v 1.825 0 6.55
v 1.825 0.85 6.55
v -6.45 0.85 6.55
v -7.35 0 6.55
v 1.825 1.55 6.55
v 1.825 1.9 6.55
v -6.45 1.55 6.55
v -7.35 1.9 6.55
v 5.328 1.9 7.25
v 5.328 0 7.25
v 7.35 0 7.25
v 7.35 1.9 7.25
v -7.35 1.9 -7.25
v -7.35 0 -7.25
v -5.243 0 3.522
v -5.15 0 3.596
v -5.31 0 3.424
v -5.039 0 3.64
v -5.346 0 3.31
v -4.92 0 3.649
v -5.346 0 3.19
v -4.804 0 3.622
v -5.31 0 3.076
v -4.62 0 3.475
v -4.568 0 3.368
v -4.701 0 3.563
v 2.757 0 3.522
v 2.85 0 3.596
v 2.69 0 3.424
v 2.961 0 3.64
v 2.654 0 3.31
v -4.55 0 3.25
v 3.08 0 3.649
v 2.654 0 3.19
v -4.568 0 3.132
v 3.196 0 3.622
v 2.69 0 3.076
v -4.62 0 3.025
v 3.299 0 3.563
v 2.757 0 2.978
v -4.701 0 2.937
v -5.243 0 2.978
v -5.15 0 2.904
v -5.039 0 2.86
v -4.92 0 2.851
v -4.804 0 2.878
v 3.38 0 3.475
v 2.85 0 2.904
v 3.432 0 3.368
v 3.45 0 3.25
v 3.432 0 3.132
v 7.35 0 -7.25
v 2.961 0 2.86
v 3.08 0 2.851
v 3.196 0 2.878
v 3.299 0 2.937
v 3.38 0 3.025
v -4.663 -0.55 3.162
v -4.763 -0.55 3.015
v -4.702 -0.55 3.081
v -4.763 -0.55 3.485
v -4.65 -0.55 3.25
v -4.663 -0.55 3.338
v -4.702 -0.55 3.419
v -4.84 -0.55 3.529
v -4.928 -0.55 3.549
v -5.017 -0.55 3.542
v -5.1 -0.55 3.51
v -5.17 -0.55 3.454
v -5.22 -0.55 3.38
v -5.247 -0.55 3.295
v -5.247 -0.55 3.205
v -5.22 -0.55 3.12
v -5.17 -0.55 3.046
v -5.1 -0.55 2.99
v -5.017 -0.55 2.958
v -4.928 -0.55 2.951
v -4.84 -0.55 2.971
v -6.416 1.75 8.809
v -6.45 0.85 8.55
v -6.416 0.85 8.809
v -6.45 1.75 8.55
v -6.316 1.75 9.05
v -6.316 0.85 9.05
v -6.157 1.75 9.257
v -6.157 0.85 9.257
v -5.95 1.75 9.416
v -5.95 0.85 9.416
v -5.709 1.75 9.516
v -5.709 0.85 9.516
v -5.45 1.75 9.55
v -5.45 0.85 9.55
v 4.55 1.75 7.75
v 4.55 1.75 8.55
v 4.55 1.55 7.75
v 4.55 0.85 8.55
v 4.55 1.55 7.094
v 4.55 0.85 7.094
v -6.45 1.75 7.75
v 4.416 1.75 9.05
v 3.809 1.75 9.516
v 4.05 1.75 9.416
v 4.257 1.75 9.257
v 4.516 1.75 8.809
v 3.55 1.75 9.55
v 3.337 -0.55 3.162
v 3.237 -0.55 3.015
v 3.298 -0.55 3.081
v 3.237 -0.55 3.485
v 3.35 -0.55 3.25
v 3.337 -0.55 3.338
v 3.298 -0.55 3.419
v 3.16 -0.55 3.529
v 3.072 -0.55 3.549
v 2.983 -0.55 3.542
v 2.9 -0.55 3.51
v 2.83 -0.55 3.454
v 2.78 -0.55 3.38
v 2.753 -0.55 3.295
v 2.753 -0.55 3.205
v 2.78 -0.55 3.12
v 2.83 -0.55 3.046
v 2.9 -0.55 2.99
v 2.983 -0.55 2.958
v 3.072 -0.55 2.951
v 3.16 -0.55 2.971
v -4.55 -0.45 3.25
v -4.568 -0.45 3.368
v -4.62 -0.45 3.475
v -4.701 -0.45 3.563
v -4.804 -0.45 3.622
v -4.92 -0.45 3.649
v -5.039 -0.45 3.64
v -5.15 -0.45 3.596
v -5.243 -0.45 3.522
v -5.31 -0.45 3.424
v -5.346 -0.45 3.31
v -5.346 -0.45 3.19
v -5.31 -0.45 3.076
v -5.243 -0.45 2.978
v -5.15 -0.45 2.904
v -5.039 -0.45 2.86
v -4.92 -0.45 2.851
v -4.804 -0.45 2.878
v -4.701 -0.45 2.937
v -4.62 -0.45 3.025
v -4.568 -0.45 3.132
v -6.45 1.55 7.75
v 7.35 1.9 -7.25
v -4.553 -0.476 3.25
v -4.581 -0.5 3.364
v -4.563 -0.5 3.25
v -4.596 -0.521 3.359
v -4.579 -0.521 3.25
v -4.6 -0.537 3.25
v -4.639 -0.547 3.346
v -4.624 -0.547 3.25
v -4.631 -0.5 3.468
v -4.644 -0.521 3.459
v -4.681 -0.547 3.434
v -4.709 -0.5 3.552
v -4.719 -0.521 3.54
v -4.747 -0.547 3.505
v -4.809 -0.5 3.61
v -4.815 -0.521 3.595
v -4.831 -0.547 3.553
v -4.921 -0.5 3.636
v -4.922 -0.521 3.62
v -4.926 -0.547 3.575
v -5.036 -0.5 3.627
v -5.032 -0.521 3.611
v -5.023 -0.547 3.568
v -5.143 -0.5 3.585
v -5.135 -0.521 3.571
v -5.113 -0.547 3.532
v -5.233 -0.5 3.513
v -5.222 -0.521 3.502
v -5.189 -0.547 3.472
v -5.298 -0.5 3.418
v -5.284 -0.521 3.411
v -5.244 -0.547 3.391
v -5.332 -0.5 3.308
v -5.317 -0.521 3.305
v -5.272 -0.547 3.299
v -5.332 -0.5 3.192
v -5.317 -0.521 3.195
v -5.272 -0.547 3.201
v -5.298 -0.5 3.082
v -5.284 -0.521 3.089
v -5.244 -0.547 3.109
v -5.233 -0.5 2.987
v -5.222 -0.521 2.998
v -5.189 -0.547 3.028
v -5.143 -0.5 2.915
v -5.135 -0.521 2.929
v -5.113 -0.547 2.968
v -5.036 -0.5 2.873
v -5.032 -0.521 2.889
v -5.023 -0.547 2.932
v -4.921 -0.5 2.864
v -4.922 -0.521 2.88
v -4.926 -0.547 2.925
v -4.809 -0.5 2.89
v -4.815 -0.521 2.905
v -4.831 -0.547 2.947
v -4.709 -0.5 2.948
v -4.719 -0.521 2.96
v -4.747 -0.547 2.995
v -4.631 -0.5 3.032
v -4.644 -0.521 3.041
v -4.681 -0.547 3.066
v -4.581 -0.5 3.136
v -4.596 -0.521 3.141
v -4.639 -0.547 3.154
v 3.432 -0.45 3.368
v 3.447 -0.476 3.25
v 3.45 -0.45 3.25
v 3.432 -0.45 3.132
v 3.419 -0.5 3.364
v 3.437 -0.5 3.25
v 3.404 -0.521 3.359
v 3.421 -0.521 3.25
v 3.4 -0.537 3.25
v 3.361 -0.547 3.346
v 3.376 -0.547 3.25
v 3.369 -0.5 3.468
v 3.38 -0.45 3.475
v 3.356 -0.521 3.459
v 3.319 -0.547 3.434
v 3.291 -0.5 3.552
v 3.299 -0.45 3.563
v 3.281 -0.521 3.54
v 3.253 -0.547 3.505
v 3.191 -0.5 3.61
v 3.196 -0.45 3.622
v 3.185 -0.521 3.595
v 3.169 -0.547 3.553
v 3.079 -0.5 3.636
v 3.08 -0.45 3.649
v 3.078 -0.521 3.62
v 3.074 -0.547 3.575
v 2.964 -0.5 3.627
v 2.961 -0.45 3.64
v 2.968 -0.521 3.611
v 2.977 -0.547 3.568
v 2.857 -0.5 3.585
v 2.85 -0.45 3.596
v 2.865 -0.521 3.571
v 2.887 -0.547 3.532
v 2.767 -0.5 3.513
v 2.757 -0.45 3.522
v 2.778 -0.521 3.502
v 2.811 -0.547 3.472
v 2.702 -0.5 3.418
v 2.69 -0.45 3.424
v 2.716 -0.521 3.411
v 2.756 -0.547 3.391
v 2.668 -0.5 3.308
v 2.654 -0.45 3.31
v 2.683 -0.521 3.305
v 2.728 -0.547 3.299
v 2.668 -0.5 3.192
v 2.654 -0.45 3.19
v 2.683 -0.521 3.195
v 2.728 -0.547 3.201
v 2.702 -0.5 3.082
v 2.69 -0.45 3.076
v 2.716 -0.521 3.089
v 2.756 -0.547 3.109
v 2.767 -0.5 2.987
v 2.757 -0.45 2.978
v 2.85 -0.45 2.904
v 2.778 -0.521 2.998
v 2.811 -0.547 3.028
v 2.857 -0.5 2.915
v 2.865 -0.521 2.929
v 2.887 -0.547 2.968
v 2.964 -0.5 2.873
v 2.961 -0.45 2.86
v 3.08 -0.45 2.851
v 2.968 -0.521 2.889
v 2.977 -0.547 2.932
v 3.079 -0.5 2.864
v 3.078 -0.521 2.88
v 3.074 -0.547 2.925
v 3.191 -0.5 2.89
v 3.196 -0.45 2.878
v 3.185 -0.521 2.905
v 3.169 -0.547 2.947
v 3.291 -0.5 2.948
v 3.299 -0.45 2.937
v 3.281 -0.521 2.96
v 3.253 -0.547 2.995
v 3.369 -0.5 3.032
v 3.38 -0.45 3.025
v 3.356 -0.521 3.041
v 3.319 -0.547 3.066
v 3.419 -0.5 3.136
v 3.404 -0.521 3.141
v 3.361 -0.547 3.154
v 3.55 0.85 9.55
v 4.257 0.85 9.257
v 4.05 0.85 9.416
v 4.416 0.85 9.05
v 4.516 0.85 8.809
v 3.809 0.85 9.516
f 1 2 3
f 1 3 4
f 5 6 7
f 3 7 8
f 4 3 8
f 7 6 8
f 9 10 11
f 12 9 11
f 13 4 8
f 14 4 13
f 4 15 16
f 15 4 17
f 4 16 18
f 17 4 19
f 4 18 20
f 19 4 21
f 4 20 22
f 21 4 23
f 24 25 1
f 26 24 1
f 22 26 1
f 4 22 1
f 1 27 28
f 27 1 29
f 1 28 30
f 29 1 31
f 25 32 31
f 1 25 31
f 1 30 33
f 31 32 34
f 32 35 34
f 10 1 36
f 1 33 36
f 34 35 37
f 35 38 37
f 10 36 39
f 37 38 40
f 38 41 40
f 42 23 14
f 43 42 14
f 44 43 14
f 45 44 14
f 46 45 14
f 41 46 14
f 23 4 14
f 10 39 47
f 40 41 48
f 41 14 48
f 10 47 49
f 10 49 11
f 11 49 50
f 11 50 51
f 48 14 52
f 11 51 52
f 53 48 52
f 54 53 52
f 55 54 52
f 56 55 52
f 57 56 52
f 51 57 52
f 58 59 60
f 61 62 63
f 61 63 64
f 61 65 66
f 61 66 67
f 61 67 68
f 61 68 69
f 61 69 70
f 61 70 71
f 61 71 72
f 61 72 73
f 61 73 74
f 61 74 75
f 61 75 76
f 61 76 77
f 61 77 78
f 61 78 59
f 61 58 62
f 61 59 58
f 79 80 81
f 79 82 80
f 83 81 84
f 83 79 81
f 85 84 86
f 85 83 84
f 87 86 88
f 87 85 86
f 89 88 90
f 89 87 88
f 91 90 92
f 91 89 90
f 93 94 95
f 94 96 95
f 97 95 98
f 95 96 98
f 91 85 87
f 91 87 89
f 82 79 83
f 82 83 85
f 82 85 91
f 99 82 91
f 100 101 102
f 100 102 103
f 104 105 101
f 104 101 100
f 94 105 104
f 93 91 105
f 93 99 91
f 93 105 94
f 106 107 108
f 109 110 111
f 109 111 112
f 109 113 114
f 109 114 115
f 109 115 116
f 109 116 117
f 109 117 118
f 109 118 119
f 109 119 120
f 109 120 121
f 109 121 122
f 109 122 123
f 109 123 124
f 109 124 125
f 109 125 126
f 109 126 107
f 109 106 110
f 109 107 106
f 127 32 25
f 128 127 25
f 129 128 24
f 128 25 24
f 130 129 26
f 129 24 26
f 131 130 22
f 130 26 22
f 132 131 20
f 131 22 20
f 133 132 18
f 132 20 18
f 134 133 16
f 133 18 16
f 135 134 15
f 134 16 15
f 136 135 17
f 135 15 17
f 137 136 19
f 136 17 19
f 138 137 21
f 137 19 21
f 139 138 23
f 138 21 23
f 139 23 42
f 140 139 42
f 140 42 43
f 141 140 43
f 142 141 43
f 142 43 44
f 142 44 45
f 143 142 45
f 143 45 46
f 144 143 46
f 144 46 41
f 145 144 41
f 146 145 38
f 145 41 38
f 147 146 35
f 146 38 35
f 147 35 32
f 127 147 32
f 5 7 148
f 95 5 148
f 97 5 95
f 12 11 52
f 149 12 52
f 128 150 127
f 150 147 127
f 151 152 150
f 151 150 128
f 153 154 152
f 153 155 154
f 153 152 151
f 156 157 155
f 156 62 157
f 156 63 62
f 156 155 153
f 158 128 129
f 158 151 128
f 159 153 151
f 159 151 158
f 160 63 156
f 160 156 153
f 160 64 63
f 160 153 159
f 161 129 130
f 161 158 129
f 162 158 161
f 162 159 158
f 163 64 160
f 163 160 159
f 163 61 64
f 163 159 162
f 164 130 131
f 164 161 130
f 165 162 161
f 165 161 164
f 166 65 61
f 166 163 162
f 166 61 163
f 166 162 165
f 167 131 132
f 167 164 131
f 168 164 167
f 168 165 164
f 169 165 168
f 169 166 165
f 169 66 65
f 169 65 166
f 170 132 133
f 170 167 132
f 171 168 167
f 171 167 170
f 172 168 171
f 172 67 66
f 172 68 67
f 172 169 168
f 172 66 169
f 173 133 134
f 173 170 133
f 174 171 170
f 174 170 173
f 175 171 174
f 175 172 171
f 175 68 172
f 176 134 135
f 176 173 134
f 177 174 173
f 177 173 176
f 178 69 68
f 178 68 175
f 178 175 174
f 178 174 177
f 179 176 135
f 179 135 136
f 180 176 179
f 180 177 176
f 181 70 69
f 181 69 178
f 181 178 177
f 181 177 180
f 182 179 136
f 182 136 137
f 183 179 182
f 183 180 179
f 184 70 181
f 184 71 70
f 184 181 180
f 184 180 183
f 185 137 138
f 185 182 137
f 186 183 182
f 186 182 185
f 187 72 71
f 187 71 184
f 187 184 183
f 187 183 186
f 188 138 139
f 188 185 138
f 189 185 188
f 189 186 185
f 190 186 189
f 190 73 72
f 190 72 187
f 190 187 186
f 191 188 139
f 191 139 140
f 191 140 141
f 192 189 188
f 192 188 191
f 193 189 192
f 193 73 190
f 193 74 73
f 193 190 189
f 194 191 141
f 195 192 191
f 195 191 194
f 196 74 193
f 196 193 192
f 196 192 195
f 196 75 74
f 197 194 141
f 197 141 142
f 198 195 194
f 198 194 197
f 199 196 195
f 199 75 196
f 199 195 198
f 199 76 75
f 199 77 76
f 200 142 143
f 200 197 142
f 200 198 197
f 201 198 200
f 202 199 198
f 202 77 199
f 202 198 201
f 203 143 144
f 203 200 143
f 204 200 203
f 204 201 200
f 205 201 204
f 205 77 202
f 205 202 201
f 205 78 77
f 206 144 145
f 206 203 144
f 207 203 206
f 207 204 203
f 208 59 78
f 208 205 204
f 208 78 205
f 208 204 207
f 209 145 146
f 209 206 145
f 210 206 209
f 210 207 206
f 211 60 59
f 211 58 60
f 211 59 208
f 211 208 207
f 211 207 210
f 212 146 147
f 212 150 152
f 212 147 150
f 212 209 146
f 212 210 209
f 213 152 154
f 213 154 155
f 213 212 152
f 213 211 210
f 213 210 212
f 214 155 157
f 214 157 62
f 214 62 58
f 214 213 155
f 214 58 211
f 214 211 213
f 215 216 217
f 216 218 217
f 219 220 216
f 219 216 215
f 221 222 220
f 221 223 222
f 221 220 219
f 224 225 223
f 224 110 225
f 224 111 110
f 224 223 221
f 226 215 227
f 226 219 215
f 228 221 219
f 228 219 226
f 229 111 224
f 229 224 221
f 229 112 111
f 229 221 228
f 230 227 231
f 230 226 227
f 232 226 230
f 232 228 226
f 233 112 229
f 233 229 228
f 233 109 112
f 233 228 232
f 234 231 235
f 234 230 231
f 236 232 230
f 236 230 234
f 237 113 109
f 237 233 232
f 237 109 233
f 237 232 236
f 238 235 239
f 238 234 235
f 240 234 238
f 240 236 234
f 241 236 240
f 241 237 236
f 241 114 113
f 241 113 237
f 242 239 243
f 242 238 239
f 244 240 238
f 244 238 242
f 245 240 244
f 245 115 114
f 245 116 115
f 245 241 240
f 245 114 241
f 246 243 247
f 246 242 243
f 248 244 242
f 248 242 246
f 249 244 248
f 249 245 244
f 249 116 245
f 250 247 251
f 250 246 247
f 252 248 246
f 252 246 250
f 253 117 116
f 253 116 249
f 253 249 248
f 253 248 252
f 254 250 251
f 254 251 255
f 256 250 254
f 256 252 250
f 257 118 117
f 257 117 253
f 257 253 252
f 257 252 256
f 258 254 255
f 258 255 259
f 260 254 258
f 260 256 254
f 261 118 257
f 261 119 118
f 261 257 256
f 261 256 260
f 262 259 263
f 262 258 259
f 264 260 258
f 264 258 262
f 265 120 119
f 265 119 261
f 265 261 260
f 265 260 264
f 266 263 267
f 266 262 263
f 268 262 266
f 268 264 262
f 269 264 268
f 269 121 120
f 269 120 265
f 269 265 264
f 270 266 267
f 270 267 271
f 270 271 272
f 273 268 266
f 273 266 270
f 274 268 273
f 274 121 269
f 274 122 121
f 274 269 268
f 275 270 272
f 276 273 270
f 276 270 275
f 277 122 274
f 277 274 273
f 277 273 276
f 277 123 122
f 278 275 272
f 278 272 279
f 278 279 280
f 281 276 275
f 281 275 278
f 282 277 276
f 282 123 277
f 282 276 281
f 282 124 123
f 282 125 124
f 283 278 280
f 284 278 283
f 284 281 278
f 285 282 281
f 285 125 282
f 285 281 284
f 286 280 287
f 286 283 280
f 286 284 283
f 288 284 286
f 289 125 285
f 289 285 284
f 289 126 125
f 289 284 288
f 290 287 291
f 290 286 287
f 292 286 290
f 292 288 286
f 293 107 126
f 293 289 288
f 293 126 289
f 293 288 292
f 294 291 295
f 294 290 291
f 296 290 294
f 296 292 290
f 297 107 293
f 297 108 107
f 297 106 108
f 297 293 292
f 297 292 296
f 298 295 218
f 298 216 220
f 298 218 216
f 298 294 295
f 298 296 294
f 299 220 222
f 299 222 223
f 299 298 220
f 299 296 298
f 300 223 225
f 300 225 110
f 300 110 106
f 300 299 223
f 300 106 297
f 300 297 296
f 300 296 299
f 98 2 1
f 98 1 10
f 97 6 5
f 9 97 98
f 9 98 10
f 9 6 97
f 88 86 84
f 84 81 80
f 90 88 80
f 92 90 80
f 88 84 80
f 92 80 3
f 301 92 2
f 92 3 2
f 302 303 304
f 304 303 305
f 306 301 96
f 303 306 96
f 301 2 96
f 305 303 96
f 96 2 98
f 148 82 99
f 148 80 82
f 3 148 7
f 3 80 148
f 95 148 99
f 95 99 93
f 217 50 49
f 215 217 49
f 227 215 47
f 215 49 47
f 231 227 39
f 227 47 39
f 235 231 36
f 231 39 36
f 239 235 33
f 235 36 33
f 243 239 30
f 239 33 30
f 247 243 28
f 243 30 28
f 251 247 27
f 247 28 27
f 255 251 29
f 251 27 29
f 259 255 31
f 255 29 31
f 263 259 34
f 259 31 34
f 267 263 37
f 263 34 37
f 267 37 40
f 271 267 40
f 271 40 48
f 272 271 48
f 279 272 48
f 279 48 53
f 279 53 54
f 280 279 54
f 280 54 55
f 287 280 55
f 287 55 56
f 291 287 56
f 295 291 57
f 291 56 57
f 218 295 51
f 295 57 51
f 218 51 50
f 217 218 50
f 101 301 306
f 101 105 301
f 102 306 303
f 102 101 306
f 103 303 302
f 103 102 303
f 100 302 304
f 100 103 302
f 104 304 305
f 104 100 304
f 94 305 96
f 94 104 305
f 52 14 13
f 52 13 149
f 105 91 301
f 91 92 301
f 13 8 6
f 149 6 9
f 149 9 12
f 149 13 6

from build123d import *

# Parameters (mm, degrees)
SKETCH1_W               = 14.7
SKETCH1_H               = 14.5
BOSS_EXTRUDE1_DEPTH     = 1.9
CUT_EXTRUDE1_DEPTH      = 1
CUT_EXTRUDE1_DEPTH_BACK = 1.9
SKETCH3_W               = 11
SKETCH3_H               = 0.7
BOSS_EXTRUDE2_DEPTH     = 3
SKETCH4_W               = 11
SKETCH4_H               = 1.8
BOSS_EXTRUDE3_DEPTH     = 0.2
FILLET1_R               = 1
SKETCH5_R               = 0.4
BOSS_EXTRUDE4_DEPTH     = 0.55
FILLET2_R               = 0.1


with BuildPart() as part:
    # Sketch1 → Boss-Extrude1 (new body)
    with BuildSketch(Plane(origin=(0, 0, 0), x_dir=(1, 0, 0), z_dir=(0, 1, 0))):
        Rectangle(SKETCH1_W, SKETCH1_H)
    extrude(amount=BOSS_EXTRUDE1_DEPTH)

    # Sketch2 → Cut-Extrude1 (cut, two sides)
    with BuildSketch(Plane(origin=(0, 1.9, 0), x_dir=(1, 0, 0), z_dir=(0, 1, 0))) as cut_extrude1_sk:
        Polygon((-57.675178239, -6.55), (-7.35, -6.55), (1.824899914, -6.55), (5.328458875, -7.25), (54.6782833, -17.109938843), (45.259811524, -117.318654275), (-67.093650016, -106.758715432), align=None)
    extrude(amount=CUT_EXTRUDE1_DEPTH, mode=Mode.SUBTRACT)
    extrude(cut_extrude1_sk.sketch, amount=-CUT_EXTRUDE1_DEPTH_BACK, mode=Mode.SUBTRACT)

    # Sketch3 → Boss-Extrude2 (add)
    with BuildSketch(Plane.XY.offset(6.55)):
        with Locations((-0.95, 1.2)):
            Rectangle(SKETCH3_W, SKETCH3_H)
    extrude(amount=BOSS_EXTRUDE2_DEPTH)

    # Sketch4 → Boss-Extrude3 (add)
    with BuildSketch(Plane(origin=(0, 1.55, 0), x_dir=(1, 0, 0), z_dir=(0, 1, 0))):
        with Locations((-0.95, -8.65)):
            Rectangle(SKETCH4_W, SKETCH4_H)
    extrude(amount=BOSS_EXTRUDE3_DEPTH)

    # Fillet1
    fillet1_edges = [part.edges().sort_by_distance(p)[0] for p in [
        (-6.45, 1.3, 9.55),
        (4.55, 1.3, 9.55),
    ]]
    fillet(fillet1_edges, radius=FILLET1_R)

    # Sketch5 → Boss-Extrude4 (add)
    with BuildSketch(Plane.XZ):
        with Locations((-4.95, 3.25)):
            Circle(SKETCH5_R)
        with Locations((3.05, 3.25)):
            Circle(SKETCH5_R)
    extrude(amount=BOSS_EXTRUDE4_DEPTH)

    # Fillet2
    fillet2_edges = [part.edges().sort_by_distance(p)[0] for p in [
        (-5.35, -0.55, 3.25),
        (2.65, -0.55, 3.25),
    ]]
    fillet(fillet2_edges, radius=FILLET2_R)


solid = part.part
